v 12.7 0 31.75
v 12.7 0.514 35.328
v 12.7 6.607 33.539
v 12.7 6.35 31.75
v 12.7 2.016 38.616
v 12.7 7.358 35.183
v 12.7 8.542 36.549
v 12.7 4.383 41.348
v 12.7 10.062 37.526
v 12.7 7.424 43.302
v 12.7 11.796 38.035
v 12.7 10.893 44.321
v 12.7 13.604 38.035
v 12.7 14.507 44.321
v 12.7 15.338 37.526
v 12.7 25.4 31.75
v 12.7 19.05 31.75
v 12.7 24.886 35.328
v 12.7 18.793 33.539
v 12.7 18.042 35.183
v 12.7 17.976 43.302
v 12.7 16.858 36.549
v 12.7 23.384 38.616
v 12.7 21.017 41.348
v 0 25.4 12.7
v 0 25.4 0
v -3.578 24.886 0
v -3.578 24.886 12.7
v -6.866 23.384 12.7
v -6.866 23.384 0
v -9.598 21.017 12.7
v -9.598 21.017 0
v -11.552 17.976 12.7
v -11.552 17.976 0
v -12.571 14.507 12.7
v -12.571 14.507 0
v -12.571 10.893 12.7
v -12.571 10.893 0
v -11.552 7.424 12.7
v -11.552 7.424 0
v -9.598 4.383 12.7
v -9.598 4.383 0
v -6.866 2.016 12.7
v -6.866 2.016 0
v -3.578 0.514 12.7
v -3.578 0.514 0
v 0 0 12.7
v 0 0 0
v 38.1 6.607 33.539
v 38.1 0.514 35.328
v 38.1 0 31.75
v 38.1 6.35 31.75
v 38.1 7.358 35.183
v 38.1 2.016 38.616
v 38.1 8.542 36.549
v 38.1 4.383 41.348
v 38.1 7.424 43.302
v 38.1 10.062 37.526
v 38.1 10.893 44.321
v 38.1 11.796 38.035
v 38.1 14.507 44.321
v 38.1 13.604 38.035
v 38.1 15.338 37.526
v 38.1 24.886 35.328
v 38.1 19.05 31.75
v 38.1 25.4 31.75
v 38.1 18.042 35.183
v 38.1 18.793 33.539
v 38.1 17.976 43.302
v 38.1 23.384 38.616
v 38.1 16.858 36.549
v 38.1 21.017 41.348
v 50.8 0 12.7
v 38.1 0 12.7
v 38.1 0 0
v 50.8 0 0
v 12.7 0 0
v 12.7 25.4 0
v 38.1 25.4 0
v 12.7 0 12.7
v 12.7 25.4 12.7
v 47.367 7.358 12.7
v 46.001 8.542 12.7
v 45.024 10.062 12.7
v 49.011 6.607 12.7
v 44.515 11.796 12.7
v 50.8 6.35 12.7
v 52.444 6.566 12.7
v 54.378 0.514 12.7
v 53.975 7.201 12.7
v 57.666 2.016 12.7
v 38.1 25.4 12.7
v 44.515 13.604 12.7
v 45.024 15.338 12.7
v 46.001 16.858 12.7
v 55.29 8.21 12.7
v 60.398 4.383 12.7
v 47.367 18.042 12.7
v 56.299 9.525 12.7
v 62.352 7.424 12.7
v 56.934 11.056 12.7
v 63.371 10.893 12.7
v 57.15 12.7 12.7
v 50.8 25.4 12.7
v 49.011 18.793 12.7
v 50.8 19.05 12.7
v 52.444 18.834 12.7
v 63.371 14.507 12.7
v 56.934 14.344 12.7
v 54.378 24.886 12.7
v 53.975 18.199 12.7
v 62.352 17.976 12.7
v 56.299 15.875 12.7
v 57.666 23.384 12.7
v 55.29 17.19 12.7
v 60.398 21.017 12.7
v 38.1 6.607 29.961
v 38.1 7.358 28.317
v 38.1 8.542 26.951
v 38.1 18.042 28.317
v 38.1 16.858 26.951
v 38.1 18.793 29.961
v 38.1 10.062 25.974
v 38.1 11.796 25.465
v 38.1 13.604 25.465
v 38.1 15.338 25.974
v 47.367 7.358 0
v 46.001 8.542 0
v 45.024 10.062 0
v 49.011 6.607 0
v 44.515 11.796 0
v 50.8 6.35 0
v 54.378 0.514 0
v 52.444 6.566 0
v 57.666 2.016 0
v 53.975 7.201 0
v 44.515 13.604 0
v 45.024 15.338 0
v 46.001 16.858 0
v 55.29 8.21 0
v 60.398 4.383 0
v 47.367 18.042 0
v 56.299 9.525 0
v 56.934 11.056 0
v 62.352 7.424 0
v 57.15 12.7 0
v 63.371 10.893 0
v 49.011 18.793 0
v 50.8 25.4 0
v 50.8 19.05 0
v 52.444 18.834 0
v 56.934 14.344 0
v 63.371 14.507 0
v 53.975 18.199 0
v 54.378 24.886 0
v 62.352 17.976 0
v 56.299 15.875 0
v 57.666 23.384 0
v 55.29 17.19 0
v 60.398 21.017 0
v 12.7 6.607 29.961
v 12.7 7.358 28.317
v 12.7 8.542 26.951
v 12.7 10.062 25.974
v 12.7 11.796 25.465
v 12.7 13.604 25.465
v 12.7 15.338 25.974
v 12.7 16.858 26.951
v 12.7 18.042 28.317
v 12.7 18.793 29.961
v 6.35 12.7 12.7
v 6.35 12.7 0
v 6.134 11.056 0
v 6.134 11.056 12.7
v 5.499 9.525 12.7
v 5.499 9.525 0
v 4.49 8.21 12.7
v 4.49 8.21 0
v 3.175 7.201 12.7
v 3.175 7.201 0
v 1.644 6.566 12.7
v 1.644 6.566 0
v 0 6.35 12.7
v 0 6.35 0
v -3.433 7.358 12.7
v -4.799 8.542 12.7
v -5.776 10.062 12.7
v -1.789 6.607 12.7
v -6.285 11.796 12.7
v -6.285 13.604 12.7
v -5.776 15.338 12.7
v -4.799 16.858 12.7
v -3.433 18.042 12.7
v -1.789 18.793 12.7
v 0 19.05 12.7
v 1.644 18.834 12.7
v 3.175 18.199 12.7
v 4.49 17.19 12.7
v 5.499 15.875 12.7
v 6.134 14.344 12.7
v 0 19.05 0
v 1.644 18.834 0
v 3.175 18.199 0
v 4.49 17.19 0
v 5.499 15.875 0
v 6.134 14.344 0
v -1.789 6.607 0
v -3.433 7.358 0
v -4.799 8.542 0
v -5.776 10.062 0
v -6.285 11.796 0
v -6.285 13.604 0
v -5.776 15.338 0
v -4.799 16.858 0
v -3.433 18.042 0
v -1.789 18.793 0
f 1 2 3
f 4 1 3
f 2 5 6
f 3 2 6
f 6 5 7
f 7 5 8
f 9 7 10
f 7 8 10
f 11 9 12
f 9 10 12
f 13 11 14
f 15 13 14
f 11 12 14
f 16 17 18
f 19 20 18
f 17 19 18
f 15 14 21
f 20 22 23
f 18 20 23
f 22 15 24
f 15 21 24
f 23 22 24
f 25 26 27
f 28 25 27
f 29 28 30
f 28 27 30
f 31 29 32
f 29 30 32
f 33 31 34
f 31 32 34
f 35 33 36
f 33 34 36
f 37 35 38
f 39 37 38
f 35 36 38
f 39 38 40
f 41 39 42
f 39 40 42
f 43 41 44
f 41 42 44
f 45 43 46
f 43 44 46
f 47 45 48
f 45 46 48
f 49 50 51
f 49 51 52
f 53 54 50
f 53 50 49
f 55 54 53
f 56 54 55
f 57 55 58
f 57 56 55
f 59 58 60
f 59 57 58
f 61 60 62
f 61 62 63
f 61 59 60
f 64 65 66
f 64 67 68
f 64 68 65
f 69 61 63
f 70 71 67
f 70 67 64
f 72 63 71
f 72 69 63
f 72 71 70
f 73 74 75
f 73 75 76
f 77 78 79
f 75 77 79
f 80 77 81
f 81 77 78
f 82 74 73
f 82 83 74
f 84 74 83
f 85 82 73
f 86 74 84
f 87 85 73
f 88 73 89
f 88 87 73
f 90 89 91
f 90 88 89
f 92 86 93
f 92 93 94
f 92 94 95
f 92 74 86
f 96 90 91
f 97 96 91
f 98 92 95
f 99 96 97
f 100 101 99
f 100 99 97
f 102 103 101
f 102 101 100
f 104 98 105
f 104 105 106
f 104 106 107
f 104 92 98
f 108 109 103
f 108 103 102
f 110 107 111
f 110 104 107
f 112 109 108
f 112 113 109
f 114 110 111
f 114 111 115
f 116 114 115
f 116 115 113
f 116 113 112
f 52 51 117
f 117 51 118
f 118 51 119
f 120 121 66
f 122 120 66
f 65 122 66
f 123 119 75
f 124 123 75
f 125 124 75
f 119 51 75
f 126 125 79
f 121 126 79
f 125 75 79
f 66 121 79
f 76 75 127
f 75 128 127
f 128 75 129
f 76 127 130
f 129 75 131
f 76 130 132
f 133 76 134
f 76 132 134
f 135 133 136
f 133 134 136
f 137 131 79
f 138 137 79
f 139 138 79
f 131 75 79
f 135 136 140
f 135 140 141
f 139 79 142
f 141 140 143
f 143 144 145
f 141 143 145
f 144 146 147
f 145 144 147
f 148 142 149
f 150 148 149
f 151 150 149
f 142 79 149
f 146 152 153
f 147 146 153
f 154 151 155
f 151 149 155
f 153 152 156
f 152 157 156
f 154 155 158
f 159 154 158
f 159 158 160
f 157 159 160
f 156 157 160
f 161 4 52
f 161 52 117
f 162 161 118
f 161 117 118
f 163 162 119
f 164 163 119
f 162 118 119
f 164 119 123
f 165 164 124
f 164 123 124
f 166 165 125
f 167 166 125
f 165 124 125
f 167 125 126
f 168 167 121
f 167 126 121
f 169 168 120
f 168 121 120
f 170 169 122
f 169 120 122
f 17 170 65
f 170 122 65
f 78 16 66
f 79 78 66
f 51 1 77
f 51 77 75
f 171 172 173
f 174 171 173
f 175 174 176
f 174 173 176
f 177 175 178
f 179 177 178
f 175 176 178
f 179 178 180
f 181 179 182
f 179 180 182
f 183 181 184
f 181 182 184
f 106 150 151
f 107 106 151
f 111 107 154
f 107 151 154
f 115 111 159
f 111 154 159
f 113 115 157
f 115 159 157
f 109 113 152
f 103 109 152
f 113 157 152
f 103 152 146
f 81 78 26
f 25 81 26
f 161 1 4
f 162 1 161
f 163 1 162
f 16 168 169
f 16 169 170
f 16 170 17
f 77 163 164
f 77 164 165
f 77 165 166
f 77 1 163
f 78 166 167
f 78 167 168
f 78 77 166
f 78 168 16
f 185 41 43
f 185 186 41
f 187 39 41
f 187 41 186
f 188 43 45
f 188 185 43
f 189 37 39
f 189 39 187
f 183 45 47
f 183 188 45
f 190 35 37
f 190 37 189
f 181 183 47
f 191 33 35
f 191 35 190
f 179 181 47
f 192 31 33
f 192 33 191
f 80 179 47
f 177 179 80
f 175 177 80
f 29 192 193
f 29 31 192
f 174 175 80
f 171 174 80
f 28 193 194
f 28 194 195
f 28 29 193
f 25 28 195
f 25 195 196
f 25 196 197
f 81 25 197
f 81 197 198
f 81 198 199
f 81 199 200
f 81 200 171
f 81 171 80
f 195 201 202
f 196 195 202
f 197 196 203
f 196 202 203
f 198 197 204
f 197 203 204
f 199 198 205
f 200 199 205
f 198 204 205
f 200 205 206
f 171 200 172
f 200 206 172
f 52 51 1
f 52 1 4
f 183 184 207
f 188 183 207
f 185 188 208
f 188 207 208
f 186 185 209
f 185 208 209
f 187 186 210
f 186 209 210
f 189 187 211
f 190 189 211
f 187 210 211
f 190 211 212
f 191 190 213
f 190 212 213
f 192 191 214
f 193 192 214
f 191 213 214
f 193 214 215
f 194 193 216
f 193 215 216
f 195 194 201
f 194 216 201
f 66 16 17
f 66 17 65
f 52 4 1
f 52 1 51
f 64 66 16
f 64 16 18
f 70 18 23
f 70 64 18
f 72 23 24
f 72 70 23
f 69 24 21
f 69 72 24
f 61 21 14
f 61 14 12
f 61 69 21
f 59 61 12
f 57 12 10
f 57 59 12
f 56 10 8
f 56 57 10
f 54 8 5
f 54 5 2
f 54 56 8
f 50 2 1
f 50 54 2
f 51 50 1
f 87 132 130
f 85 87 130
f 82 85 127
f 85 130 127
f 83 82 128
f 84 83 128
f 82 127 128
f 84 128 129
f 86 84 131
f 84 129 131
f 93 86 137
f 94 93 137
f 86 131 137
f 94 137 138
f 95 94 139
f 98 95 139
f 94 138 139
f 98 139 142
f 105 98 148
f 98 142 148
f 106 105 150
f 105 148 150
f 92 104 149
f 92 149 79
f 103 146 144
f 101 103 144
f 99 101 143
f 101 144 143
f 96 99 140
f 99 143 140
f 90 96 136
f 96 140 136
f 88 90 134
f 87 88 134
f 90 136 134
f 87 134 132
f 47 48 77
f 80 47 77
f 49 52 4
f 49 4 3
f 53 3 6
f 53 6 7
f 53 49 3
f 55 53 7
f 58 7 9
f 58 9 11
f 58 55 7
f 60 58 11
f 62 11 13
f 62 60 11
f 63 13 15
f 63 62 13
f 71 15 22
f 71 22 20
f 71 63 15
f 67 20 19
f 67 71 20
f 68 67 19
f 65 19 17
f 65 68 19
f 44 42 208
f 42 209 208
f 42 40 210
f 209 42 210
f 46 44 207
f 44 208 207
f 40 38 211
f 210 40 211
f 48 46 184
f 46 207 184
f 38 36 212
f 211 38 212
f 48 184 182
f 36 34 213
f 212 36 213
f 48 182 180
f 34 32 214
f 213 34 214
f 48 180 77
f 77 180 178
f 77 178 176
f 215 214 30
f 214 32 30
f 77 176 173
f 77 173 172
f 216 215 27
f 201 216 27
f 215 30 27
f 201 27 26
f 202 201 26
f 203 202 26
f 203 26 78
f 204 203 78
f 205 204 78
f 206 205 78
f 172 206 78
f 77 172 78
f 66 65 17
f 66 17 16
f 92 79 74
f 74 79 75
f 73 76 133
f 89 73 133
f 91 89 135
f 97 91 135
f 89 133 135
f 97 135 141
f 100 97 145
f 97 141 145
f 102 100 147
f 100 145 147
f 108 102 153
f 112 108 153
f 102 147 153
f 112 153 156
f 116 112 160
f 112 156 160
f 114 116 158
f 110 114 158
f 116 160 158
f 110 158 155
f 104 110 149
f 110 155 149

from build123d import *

# Parameters (mm, degrees)
F1_DEPTH = 12.7
F0_W     = 25.4
F0_H     = 25.4
F2_DEPTH = 31.75
F4_DEPTH = 25.4
F3_R     = 6.35
F5_DEPTH = 25.4


with BuildPart() as f1:
    # F0 (on Top) → F1 (new body)
    with BuildSketch(Plane.XY):
        with BuildLine():
            ThreePointArc((0, 25.4), (-12.7, 12.7), (0, 0))
            Line((0, 0), (0, 6.35))
            ThreePointArc((0, 6.35), (-6.35, 12.7), (0, 19.05))
            Line((0, 19.05), (0, 25.4))
        make_face()
        with BuildLine():
            Line((0, 6.35), (0, 0))
            Line((0, 0), (12.7, 0))
            Line((12.7, 0), (12.7, 25.4))
            Line((12.7, 25.4), (0, 25.4))
            Line((0, 25.4), (0, 19.05))
            ThreePointArc((0, 19.05), (4.4901280605, 17.1901280605), (6.35, 12.7))
            ThreePointArc((6.35, 12.7), (4.4901280605, 8.2098719395), (0, 6.35))
        make_face()
    extrude(amount=F1_DEPTH)


with BuildPart() as f1b:
    # F0 (on Top) → F1, piece 2 (new body)
    with BuildSketch(Plane.XY):
        with BuildLine():
            Line((38.1, 25.4), (38.1, 0))
            Line((38.1, 0), (50.8, 0))
            Line((50.8, 0), (50.8, 6.35))
            ThreePointArc((50.8, 6.35), (44.45, 12.7), (50.8, 19.05))
            Line((50.8, 19.05), (50.8, 25.4))
            Line((50.8, 25.4), (38.1, 25.4))
        make_face()
        with BuildLine():
            Line((50.8, 6.35), (50.8, 0))
            ThreePointArc((50.8, 0), (63.5, 12.7), (50.8, 25.4))
            Line((50.8, 25.4), (50.8, 19.05))
            ThreePointArc((50.8, 19.05), (55.2901280605, 17.1901280605), (57.15, 12.7))
            ThreePointArc((57.15, 12.7), (55.2901280605, 8.2098719395), (50.8, 6.35))
        make_face()
    extrude(amount=F1_DEPTH)


with BuildPart() as f2:
    # F0 (on Top) → F2 (new body)
    with BuildSketch(Plane.XY):
        with Locations((25.4, 12.7)):
            Rectangle(F0_W, F0_H)
    extrude(amount=F2_DEPTH)

    # F3 (on face) → F5 (cut)
    with BuildSketch(Plane.YZ.offset(38.1)):
        with Locations((12.7, 31.75)):
            Circle(F3_R)
    extrude(amount=-F5_DEPTH, mode=Mode.SUBTRACT)


with BuildPart() as f4:
    # F3 (on face) → F4 (new body)
    with BuildSketch(Plane.YZ.offset(38.1)):
        with BuildLine():
            Line((19.05, 31.75), (25.4, 31.75))
            ThreePointArc((25.4, 31.75), (12.7, 44.45), (0, 31.75))
            Line((0, 31.75), (6.35, 31.75))
            ThreePointArc((6.35, 31.75), (12.7, 38.1), (19.05, 31.75))
        make_face()
    extrude(amount=-F4_DEPTH)


solid = Compound([f1.part, f1b.part, f2.part, f4.part])
